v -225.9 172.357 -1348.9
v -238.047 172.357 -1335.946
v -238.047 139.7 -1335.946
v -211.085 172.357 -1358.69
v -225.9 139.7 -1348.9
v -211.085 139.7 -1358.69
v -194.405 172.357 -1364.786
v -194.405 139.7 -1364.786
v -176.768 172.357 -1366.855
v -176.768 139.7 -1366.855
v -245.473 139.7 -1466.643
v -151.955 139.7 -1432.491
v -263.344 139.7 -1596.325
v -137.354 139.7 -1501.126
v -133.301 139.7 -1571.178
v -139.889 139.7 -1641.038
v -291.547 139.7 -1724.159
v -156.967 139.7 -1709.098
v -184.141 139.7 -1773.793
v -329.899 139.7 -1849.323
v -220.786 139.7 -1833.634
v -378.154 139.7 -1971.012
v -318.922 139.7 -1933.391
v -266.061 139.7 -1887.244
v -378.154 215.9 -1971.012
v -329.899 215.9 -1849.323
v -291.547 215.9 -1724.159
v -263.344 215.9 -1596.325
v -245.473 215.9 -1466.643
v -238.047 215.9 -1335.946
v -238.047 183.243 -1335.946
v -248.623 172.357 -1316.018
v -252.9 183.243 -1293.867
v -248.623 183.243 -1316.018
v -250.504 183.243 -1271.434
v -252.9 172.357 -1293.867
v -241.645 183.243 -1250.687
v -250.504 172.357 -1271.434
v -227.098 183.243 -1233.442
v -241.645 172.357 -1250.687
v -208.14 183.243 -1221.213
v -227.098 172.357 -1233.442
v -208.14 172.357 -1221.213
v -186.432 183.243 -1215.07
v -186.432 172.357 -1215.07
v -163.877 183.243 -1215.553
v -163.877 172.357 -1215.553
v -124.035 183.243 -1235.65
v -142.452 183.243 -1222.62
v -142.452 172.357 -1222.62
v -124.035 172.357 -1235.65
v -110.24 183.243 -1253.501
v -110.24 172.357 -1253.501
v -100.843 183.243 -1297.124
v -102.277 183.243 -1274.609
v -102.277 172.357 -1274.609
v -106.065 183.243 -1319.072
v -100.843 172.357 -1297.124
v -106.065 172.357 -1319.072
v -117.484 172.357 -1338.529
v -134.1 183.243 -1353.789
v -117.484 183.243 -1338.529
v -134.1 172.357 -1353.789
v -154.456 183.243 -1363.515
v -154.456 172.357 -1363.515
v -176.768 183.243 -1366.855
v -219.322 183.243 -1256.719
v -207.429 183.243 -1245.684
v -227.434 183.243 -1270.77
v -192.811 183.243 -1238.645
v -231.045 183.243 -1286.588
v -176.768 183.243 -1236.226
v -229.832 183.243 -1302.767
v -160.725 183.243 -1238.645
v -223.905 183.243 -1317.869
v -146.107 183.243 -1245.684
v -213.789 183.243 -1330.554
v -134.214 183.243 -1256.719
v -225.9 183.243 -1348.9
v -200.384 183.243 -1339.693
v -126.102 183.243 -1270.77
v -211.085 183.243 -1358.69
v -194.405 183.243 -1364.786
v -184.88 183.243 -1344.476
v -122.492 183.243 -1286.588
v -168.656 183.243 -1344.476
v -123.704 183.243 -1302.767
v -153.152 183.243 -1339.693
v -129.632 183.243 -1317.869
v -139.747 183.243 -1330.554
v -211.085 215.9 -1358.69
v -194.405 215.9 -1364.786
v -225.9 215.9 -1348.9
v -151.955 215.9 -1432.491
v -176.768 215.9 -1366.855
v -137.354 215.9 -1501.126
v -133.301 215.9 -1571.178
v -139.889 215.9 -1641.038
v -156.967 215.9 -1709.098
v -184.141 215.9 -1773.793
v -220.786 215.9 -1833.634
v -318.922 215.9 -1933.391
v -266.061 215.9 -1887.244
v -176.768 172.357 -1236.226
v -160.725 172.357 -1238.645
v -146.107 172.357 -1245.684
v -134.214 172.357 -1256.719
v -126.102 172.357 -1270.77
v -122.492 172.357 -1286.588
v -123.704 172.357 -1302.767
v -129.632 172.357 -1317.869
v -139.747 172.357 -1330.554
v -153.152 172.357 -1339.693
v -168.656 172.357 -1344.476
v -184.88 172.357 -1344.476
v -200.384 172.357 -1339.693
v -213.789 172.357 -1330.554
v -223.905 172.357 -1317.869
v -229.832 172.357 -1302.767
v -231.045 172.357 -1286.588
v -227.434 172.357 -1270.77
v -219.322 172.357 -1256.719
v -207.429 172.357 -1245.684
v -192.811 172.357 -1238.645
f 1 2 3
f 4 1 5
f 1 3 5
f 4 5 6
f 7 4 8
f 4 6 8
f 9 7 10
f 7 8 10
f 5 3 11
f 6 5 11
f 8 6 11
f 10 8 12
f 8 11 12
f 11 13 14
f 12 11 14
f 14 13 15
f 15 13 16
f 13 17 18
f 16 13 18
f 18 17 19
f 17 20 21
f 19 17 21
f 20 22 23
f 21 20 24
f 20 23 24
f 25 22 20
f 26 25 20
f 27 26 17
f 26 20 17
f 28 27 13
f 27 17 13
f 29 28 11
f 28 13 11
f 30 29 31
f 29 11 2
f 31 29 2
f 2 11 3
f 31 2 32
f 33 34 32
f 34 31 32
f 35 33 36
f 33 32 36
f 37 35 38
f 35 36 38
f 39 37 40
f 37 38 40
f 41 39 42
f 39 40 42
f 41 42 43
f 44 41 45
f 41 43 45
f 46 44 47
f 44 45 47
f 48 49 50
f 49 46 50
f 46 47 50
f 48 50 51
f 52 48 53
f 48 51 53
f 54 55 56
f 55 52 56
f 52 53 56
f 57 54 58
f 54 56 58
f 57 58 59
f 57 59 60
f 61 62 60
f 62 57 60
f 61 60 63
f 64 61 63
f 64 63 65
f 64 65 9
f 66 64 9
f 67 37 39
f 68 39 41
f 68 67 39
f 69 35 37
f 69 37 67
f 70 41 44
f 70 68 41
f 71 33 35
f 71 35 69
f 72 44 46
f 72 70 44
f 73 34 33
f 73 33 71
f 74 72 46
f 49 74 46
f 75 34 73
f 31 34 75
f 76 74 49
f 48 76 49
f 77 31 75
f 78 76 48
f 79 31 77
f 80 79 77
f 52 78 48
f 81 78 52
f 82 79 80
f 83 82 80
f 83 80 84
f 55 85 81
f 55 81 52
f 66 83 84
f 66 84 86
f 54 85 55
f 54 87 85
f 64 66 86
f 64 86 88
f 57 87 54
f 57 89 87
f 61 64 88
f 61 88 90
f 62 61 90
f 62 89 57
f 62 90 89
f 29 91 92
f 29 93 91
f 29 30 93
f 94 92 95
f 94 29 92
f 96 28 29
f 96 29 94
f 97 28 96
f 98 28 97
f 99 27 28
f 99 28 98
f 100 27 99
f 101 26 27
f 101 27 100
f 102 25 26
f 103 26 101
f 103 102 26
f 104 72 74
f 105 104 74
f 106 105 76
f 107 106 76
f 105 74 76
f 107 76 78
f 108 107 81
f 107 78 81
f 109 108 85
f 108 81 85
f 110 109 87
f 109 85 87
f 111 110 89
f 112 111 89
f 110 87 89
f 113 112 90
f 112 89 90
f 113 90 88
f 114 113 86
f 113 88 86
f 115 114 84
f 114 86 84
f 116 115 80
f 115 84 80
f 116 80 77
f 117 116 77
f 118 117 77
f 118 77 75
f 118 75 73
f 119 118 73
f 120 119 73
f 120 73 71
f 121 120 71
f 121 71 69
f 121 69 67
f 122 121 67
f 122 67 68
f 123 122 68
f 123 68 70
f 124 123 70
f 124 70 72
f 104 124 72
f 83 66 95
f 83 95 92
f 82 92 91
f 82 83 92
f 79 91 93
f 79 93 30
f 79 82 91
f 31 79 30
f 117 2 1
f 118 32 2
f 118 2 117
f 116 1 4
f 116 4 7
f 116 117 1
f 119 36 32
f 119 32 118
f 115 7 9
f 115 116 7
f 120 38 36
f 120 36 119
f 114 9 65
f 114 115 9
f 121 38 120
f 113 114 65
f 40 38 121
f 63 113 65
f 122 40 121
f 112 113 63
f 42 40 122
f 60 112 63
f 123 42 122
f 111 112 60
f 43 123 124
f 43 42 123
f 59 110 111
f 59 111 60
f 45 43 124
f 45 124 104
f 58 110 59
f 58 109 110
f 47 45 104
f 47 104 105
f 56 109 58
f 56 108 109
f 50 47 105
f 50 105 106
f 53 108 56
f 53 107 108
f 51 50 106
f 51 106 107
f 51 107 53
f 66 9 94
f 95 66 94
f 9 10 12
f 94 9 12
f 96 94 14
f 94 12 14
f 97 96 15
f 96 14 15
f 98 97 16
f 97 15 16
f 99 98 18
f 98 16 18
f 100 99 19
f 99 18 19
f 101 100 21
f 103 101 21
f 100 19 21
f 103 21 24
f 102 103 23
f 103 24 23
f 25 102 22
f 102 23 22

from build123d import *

# Parameters (mm, degrees)
BOSS_EXTRUDE1_DEPTH = 355.6
CUT_EXTRUDE2_START  = -152.4
SKETCH5_R           = 355.6
CUT_EXTRUDE2_DEPTH  = 152.4
SKETCH6_R           = 355.6
CUT_EXTRUDE3_DEPTH  = 152.4
SKETCH7_R           = 254
CUT_EXTRUDE4_DEPTH  = 152.4
CUT_EXTRUDE5_DEPTH  = 635
SCALE1_SCALE        = 0.214285714


with BuildPart() as part:
    # Sketch2 → Boss-Extrude1 (new body)
    with BuildSketch(Plane(origin=(0, 0, 0), x_dir=(1, 0, 0), z_dir=(0, 1, 0))):
        with BuildLine():
            ThreePointArc((-939.8, 3175), (-1137.137455821, 1577.520446779), (-285.969579472, 211.359314005))
            ThreePointArc((-285.969579472, 211.359314005), (160.143666656, -317.498607918), (0, 355.6))
            ThreePointArc((0, 355.6), (92.407240491, 1952.73574683), (-939.8, 3175))
        make_face()
    extrude(amount=BOSS_EXTRUDE1_DEPTH)

    # Sketch5 → Cut-Extrude2 (cut)
    with BuildSketch(Plane(origin=(0, 355.6, 0), x_dir=(1, 0, 0), z_dir=(0, 1, 0)).offset(CUT_EXTRUDE2_START)):
        Circle(SKETCH5_R)
    extrude(amount=CUT_EXTRUDE2_DEPTH, mode=Mode.SUBTRACT)

    # Sketch6 → Cut-Extrude3 (cut)
    with BuildSketch(Plane.XZ):
        Circle(SKETCH6_R)
    extrude(amount=-CUT_EXTRUDE3_DEPTH, mode=Mode.SUBTRACT)

    # Sketch7 → Cut-Extrude4 (cut)
    with BuildSketch(Plane(origin=(0, 203.2, 0), x_dir=(1, 0, 0), z_dir=(0, 1, 0))):
        Circle(SKETCH7_R)
    extrude(amount=-CUT_EXTRUDE4_DEPTH, mode=Mode.SUBTRACT)

    # Sketch8 → Cut-Extrude5 (cut)
    with BuildSketch(Plane.XZ):
        with BuildLine():
            ThreePointArc((-285.969579472, -211.359314005), (-1137.137455821, -1577.520446779), (-939.8, -3175))
            ThreePointArc((-939.8, -3175), (-463.84673696, -1726.060030518), (-285.969579472, -211.359314005))
        make_face()
    extrude(amount=-CUT_EXTRUDE5_DEPTH, mode=Mode.SUBTRACT)


with BuildPart() as part_1:
    # Scale1: scaled about (-224.977664094, 177.8, -1642.651878674)
    add(part.part.scale(SCALE1_SCALE).moved(Location((-176.768164645, 139.7, -1290.65504753))))


solid = part_1.part
